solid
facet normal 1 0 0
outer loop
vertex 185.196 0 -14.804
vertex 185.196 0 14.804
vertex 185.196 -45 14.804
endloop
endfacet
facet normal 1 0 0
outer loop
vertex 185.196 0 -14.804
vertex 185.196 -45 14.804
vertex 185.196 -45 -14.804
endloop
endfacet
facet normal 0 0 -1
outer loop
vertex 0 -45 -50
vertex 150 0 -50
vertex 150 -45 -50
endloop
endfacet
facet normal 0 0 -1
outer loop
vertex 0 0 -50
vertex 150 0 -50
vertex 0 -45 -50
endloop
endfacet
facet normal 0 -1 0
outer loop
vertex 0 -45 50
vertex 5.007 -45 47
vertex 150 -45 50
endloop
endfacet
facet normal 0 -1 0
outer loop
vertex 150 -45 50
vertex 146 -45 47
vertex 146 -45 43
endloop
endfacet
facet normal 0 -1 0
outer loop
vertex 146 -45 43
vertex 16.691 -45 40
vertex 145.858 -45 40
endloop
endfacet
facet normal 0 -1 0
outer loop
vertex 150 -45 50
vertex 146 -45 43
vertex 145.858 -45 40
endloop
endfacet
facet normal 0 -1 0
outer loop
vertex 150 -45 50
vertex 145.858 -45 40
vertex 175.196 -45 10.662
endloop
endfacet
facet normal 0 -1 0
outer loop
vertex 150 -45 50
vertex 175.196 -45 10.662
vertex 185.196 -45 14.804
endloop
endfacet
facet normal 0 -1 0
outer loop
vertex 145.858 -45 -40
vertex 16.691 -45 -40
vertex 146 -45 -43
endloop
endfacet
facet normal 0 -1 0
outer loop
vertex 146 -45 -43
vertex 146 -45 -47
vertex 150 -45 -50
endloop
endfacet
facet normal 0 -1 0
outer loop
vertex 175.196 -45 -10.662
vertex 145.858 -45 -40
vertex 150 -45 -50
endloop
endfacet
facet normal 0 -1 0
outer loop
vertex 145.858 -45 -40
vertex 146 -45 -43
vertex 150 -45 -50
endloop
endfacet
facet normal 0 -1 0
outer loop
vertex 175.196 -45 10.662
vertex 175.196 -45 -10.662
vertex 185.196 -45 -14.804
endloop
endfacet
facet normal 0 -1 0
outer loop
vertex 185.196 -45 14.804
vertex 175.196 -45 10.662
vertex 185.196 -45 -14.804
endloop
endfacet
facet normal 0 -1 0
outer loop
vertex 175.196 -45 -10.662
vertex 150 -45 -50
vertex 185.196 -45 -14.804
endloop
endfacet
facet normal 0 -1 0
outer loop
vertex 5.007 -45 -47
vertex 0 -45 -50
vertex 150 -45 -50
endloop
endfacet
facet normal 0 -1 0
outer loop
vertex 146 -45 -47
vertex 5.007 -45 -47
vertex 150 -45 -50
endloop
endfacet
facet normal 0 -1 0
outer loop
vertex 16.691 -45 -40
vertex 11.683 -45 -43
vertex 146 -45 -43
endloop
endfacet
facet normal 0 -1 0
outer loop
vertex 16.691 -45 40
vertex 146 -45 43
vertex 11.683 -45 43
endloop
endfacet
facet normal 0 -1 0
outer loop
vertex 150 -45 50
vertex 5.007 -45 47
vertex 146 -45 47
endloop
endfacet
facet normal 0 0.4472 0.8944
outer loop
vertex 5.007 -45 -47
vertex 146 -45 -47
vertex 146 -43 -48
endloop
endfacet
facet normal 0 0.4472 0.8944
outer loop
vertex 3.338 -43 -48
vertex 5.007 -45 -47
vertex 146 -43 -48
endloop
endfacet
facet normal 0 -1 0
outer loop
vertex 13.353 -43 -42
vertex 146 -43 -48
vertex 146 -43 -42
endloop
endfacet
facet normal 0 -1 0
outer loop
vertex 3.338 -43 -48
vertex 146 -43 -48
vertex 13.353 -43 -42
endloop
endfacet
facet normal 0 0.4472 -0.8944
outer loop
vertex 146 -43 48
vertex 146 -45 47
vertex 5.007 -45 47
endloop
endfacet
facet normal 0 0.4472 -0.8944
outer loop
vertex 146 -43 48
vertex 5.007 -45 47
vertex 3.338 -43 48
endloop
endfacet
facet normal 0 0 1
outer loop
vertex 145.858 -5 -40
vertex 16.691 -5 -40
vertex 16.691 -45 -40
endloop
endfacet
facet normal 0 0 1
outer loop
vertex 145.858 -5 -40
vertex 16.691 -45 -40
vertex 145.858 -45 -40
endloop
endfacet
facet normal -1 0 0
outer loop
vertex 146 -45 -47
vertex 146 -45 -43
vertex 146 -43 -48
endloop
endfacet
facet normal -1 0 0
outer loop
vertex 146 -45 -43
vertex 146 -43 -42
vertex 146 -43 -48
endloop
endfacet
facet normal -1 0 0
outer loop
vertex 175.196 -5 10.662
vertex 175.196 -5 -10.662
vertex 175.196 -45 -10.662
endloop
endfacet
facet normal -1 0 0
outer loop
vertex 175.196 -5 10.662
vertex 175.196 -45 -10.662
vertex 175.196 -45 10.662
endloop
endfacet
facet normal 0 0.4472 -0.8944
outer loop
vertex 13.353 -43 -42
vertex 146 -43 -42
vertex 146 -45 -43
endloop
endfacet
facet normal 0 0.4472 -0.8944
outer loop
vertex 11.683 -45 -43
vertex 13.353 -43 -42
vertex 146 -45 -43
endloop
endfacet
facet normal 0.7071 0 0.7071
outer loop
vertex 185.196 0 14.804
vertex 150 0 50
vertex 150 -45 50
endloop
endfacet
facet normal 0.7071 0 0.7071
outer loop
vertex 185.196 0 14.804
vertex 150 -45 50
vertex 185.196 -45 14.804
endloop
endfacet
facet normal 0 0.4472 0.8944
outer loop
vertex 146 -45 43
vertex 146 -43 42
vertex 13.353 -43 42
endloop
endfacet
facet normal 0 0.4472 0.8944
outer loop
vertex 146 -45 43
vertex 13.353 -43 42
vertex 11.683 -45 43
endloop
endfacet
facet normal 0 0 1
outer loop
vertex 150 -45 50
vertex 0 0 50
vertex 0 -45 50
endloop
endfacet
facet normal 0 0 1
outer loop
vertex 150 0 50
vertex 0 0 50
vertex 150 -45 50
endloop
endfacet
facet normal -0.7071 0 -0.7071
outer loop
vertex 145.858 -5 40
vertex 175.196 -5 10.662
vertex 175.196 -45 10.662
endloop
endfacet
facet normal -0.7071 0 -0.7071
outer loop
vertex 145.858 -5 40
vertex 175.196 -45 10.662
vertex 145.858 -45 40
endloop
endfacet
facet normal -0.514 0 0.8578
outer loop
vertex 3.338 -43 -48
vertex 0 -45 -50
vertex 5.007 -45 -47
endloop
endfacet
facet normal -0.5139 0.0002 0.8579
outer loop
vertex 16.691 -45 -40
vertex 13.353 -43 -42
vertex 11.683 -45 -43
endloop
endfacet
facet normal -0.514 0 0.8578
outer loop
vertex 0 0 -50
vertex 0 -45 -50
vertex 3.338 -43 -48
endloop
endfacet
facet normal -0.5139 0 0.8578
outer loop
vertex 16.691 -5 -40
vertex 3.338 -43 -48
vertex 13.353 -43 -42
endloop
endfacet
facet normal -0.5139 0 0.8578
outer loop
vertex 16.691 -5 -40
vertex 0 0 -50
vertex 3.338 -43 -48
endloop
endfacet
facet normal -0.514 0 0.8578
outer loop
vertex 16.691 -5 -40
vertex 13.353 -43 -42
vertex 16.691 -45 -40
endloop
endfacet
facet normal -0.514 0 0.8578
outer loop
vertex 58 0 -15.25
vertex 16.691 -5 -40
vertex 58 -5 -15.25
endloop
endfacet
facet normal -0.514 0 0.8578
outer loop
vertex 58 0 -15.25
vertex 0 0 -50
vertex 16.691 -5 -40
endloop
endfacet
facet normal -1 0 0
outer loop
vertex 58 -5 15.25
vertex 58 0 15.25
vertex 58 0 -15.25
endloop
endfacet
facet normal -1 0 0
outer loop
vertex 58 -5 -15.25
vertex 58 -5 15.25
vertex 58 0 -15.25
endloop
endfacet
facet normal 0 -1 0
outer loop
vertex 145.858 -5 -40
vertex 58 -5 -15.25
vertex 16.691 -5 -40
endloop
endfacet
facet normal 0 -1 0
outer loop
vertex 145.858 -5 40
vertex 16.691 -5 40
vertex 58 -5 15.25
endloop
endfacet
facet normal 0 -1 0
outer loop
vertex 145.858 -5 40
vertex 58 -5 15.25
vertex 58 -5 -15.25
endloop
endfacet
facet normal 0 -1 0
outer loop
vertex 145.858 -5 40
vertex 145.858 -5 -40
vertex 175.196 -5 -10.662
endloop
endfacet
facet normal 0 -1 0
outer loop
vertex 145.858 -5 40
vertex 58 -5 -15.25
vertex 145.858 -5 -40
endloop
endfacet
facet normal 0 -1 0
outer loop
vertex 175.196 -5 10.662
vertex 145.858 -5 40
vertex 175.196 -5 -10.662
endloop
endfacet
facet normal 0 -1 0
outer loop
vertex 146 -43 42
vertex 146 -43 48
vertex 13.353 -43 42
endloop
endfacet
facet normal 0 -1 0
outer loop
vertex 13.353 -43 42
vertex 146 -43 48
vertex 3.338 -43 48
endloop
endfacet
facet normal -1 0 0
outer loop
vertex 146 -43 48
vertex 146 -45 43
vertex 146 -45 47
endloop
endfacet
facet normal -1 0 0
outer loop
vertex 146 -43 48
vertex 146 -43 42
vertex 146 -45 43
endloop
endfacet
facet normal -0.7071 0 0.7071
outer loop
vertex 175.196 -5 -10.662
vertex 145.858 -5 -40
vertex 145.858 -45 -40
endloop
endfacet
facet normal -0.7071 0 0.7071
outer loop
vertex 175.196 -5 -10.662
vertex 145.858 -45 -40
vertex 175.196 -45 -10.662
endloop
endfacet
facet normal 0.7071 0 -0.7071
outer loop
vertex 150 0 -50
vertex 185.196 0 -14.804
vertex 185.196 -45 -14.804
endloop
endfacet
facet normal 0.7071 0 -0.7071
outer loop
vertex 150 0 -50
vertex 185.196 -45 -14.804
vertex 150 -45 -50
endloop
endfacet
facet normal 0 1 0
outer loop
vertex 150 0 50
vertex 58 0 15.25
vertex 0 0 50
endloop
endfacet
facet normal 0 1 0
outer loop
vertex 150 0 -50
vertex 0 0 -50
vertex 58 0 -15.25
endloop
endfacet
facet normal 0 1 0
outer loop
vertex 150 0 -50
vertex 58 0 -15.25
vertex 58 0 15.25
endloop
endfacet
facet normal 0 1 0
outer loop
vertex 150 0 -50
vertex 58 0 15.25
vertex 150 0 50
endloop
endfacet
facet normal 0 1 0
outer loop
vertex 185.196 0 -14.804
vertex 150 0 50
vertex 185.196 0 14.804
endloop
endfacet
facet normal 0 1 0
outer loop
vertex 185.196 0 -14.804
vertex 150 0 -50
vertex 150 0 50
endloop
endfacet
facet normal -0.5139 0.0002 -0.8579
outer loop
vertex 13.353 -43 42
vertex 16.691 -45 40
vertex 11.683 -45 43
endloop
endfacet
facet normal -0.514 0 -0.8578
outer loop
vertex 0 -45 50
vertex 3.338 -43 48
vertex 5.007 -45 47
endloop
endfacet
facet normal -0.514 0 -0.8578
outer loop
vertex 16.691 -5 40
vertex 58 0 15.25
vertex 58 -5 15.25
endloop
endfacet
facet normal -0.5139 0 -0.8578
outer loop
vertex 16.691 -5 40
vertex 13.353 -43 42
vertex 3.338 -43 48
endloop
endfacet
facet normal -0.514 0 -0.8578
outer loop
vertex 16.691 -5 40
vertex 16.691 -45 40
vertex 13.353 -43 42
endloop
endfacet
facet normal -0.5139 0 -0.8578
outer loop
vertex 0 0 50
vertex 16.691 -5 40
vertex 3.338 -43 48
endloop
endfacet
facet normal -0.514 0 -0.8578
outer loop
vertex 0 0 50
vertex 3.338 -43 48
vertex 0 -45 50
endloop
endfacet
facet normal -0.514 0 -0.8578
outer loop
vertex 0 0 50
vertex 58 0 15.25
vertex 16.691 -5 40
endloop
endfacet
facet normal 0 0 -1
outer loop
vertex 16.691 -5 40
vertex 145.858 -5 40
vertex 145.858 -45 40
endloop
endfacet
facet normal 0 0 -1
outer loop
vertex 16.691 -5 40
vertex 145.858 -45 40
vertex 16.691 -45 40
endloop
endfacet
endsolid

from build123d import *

# Parameters (mm, degrees)
BOSS_EXTRUDE1_DEPTH     = 45
SKETCH2_W               = 40
SKETCH2_H               = 20.5
CUT_EXTRUDE1_DEPTH      = 41
SKETCH3_W               = 8.5
SKETCH3_H               = 20.5
SKETCH3_R               = 1.5
CUT_EXTRUDE2_DEPTH      = 14
SKETCH3_3_R             = 1.5
CUT_EXTRUDE3_DEPTH      = 19
CUT_EXTRUDE4_DEPTH      = 87
CUT_EXTRUDE5_DEPTH      = 198.034718556
CUT_EXTRUDE5_DEPTH_BACK = 40
CUT_EXTRUDE6_DEPTH      = 146


with BuildPart() as part:
    # Sketch1 → Boss-Extrude1 (new body)
    with BuildSketch(Plane(origin=(0, 0, 0), x_dir=(1, 0, 0), z_dir=(0, 1, 0))):
        with BuildLine():
            Line((150, 50), (0, 50))
            ThreePointArc((0, 50), (-50, 0), (0, -50))
            Line((0, -50), (150, -50))
            Line((150, -50), (185.196329112, -14.803670888))
            Line((185.196329112, -14.803670888), (185.196329112, 14.803670888))
            Line((185.196329112, 14.803670888), (150, 50))
        make_face()
    extrude(amount=-BOSS_EXTRUDE1_DEPTH)

    # Sketch2 → Cut-Extrude1 (cut)
    with BuildSketch(Plane(origin=(0, 0, 0), x_dir=(1, 0, 0), z_dir=(0, 1, 0))):
        with Locations((24.5, 0)):
            Rectangle(SKETCH2_W, SKETCH2_H)
    extrude(amount=-CUT_EXTRUDE1_DEPTH, mode=Mode.SUBTRACT)

    # Sketch3 → Cut-Extrude2 (cut)
    # profile 1 of 2: a face of its own
    with BuildSketch(Plane(origin=(0, 0, 0), x_dir=(1, 0, 0), z_dir=(0, 1, 0))):
        with Locations((48.75, 0)):
            Rectangle(SKETCH3_W, SKETCH3_H)
        with Locations((48.5, -5)):
            Circle(SKETCH3_R, mode=Mode.SUBTRACT)
        with Locations((48.5, 5)):
            Circle(SKETCH3_R, mode=Mode.SUBTRACT)
    # profile 2 of 2: a face of its own
    with BuildSketch(Plane(origin=(0, 0, 0), x_dir=(1, 0, 0), z_dir=(0, 1, 0))):
        with Locations((0.25, 0)):
            Rectangle(SKETCH3_W, SKETCH3_H)
        with Locations((0.5, -5)):
            Circle(SKETCH3_R, mode=Mode.SUBTRACT)
        with Locations((0.5, 5)):
            Circle(SKETCH3_R, mode=Mode.SUBTRACT)
    extrude(amount=-CUT_EXTRUDE2_DEPTH, mode=Mode.SUBTRACT)

    # Sketch3<3> → Cut-Extrude3 (cut)
    with BuildSketch(Plane(origin=(0, 0, 0), x_dir=(1, 0, 0), z_dir=(0, 1, 0))):
        with Locations((0.5, 5)):
            Circle(SKETCH3_3_R)
        with Locations((0.5, -5)):
            Circle(SKETCH3_3_R)
        with Locations((48.5, -5)):
            Circle(SKETCH3_3_R)
        with Locations((48.5, 5)):
            Circle(SKETCH3_3_R)
    extrude(amount=-CUT_EXTRUDE3_DEPTH, mode=Mode.SUBTRACT)

    # Sketch3<4> → Cut-Extrude4 (cut)
    with BuildSketch(Plane(origin=(0, 0, 0), x_dir=(1, 0, 0), z_dir=(0, 1, 0))):
        with BuildLine():
            Line((58, -15.25), (58, 15.25))
            Line((58, 15.25), (0, 50))
            ThreePointArc((0, 50), (-50, 0), (0, -50))
            Line((0, -50), (58, -15.25))
        make_face()
    extrude(amount=-CUT_EXTRUDE4_DEPTH, mode=Mode.SUBTRACT)

    # Sketch5 → Cut-Extrude5 (cut, two sides: drawn at the far end of the back side and taken through both)
    with BuildSketch(Plane.XZ.offset(45).offset(-CUT_EXTRUDE5_DEPTH_BACK)):
        Polygon((36.14772109, 40), (16.690647482, 40), (58, 15.25), (58, -15.25), (16.690647482, -40), (36.14772109, -40), (145.857864376, -40), (175.196329112, -10.661535265), (175.196329112, 10.661535265), (145.857864376, 40), align=None)
    extrude(amount=CUT_EXTRUDE5_DEPTH + CUT_EXTRUDE5_DEPTH_BACK, mode=Mode.SUBTRACT)

    # Sketch6 → Cut-Extrude6 (cut)
    with BuildSketch(Plane.ZY):
        Polygon((43, -45), (47, -45), (48, -43), (42, -43), align=None)
    cut_extrude6 = extrude(amount=-CUT_EXTRUDE6_DEPTH, mode=Mode.SUBTRACT)

    # Mirror1: Cut-Extrude6 across plane
    add(cut_extrude6.mirror(Plane.XY), mode=Mode.SUBTRACT)


solid = part.part
